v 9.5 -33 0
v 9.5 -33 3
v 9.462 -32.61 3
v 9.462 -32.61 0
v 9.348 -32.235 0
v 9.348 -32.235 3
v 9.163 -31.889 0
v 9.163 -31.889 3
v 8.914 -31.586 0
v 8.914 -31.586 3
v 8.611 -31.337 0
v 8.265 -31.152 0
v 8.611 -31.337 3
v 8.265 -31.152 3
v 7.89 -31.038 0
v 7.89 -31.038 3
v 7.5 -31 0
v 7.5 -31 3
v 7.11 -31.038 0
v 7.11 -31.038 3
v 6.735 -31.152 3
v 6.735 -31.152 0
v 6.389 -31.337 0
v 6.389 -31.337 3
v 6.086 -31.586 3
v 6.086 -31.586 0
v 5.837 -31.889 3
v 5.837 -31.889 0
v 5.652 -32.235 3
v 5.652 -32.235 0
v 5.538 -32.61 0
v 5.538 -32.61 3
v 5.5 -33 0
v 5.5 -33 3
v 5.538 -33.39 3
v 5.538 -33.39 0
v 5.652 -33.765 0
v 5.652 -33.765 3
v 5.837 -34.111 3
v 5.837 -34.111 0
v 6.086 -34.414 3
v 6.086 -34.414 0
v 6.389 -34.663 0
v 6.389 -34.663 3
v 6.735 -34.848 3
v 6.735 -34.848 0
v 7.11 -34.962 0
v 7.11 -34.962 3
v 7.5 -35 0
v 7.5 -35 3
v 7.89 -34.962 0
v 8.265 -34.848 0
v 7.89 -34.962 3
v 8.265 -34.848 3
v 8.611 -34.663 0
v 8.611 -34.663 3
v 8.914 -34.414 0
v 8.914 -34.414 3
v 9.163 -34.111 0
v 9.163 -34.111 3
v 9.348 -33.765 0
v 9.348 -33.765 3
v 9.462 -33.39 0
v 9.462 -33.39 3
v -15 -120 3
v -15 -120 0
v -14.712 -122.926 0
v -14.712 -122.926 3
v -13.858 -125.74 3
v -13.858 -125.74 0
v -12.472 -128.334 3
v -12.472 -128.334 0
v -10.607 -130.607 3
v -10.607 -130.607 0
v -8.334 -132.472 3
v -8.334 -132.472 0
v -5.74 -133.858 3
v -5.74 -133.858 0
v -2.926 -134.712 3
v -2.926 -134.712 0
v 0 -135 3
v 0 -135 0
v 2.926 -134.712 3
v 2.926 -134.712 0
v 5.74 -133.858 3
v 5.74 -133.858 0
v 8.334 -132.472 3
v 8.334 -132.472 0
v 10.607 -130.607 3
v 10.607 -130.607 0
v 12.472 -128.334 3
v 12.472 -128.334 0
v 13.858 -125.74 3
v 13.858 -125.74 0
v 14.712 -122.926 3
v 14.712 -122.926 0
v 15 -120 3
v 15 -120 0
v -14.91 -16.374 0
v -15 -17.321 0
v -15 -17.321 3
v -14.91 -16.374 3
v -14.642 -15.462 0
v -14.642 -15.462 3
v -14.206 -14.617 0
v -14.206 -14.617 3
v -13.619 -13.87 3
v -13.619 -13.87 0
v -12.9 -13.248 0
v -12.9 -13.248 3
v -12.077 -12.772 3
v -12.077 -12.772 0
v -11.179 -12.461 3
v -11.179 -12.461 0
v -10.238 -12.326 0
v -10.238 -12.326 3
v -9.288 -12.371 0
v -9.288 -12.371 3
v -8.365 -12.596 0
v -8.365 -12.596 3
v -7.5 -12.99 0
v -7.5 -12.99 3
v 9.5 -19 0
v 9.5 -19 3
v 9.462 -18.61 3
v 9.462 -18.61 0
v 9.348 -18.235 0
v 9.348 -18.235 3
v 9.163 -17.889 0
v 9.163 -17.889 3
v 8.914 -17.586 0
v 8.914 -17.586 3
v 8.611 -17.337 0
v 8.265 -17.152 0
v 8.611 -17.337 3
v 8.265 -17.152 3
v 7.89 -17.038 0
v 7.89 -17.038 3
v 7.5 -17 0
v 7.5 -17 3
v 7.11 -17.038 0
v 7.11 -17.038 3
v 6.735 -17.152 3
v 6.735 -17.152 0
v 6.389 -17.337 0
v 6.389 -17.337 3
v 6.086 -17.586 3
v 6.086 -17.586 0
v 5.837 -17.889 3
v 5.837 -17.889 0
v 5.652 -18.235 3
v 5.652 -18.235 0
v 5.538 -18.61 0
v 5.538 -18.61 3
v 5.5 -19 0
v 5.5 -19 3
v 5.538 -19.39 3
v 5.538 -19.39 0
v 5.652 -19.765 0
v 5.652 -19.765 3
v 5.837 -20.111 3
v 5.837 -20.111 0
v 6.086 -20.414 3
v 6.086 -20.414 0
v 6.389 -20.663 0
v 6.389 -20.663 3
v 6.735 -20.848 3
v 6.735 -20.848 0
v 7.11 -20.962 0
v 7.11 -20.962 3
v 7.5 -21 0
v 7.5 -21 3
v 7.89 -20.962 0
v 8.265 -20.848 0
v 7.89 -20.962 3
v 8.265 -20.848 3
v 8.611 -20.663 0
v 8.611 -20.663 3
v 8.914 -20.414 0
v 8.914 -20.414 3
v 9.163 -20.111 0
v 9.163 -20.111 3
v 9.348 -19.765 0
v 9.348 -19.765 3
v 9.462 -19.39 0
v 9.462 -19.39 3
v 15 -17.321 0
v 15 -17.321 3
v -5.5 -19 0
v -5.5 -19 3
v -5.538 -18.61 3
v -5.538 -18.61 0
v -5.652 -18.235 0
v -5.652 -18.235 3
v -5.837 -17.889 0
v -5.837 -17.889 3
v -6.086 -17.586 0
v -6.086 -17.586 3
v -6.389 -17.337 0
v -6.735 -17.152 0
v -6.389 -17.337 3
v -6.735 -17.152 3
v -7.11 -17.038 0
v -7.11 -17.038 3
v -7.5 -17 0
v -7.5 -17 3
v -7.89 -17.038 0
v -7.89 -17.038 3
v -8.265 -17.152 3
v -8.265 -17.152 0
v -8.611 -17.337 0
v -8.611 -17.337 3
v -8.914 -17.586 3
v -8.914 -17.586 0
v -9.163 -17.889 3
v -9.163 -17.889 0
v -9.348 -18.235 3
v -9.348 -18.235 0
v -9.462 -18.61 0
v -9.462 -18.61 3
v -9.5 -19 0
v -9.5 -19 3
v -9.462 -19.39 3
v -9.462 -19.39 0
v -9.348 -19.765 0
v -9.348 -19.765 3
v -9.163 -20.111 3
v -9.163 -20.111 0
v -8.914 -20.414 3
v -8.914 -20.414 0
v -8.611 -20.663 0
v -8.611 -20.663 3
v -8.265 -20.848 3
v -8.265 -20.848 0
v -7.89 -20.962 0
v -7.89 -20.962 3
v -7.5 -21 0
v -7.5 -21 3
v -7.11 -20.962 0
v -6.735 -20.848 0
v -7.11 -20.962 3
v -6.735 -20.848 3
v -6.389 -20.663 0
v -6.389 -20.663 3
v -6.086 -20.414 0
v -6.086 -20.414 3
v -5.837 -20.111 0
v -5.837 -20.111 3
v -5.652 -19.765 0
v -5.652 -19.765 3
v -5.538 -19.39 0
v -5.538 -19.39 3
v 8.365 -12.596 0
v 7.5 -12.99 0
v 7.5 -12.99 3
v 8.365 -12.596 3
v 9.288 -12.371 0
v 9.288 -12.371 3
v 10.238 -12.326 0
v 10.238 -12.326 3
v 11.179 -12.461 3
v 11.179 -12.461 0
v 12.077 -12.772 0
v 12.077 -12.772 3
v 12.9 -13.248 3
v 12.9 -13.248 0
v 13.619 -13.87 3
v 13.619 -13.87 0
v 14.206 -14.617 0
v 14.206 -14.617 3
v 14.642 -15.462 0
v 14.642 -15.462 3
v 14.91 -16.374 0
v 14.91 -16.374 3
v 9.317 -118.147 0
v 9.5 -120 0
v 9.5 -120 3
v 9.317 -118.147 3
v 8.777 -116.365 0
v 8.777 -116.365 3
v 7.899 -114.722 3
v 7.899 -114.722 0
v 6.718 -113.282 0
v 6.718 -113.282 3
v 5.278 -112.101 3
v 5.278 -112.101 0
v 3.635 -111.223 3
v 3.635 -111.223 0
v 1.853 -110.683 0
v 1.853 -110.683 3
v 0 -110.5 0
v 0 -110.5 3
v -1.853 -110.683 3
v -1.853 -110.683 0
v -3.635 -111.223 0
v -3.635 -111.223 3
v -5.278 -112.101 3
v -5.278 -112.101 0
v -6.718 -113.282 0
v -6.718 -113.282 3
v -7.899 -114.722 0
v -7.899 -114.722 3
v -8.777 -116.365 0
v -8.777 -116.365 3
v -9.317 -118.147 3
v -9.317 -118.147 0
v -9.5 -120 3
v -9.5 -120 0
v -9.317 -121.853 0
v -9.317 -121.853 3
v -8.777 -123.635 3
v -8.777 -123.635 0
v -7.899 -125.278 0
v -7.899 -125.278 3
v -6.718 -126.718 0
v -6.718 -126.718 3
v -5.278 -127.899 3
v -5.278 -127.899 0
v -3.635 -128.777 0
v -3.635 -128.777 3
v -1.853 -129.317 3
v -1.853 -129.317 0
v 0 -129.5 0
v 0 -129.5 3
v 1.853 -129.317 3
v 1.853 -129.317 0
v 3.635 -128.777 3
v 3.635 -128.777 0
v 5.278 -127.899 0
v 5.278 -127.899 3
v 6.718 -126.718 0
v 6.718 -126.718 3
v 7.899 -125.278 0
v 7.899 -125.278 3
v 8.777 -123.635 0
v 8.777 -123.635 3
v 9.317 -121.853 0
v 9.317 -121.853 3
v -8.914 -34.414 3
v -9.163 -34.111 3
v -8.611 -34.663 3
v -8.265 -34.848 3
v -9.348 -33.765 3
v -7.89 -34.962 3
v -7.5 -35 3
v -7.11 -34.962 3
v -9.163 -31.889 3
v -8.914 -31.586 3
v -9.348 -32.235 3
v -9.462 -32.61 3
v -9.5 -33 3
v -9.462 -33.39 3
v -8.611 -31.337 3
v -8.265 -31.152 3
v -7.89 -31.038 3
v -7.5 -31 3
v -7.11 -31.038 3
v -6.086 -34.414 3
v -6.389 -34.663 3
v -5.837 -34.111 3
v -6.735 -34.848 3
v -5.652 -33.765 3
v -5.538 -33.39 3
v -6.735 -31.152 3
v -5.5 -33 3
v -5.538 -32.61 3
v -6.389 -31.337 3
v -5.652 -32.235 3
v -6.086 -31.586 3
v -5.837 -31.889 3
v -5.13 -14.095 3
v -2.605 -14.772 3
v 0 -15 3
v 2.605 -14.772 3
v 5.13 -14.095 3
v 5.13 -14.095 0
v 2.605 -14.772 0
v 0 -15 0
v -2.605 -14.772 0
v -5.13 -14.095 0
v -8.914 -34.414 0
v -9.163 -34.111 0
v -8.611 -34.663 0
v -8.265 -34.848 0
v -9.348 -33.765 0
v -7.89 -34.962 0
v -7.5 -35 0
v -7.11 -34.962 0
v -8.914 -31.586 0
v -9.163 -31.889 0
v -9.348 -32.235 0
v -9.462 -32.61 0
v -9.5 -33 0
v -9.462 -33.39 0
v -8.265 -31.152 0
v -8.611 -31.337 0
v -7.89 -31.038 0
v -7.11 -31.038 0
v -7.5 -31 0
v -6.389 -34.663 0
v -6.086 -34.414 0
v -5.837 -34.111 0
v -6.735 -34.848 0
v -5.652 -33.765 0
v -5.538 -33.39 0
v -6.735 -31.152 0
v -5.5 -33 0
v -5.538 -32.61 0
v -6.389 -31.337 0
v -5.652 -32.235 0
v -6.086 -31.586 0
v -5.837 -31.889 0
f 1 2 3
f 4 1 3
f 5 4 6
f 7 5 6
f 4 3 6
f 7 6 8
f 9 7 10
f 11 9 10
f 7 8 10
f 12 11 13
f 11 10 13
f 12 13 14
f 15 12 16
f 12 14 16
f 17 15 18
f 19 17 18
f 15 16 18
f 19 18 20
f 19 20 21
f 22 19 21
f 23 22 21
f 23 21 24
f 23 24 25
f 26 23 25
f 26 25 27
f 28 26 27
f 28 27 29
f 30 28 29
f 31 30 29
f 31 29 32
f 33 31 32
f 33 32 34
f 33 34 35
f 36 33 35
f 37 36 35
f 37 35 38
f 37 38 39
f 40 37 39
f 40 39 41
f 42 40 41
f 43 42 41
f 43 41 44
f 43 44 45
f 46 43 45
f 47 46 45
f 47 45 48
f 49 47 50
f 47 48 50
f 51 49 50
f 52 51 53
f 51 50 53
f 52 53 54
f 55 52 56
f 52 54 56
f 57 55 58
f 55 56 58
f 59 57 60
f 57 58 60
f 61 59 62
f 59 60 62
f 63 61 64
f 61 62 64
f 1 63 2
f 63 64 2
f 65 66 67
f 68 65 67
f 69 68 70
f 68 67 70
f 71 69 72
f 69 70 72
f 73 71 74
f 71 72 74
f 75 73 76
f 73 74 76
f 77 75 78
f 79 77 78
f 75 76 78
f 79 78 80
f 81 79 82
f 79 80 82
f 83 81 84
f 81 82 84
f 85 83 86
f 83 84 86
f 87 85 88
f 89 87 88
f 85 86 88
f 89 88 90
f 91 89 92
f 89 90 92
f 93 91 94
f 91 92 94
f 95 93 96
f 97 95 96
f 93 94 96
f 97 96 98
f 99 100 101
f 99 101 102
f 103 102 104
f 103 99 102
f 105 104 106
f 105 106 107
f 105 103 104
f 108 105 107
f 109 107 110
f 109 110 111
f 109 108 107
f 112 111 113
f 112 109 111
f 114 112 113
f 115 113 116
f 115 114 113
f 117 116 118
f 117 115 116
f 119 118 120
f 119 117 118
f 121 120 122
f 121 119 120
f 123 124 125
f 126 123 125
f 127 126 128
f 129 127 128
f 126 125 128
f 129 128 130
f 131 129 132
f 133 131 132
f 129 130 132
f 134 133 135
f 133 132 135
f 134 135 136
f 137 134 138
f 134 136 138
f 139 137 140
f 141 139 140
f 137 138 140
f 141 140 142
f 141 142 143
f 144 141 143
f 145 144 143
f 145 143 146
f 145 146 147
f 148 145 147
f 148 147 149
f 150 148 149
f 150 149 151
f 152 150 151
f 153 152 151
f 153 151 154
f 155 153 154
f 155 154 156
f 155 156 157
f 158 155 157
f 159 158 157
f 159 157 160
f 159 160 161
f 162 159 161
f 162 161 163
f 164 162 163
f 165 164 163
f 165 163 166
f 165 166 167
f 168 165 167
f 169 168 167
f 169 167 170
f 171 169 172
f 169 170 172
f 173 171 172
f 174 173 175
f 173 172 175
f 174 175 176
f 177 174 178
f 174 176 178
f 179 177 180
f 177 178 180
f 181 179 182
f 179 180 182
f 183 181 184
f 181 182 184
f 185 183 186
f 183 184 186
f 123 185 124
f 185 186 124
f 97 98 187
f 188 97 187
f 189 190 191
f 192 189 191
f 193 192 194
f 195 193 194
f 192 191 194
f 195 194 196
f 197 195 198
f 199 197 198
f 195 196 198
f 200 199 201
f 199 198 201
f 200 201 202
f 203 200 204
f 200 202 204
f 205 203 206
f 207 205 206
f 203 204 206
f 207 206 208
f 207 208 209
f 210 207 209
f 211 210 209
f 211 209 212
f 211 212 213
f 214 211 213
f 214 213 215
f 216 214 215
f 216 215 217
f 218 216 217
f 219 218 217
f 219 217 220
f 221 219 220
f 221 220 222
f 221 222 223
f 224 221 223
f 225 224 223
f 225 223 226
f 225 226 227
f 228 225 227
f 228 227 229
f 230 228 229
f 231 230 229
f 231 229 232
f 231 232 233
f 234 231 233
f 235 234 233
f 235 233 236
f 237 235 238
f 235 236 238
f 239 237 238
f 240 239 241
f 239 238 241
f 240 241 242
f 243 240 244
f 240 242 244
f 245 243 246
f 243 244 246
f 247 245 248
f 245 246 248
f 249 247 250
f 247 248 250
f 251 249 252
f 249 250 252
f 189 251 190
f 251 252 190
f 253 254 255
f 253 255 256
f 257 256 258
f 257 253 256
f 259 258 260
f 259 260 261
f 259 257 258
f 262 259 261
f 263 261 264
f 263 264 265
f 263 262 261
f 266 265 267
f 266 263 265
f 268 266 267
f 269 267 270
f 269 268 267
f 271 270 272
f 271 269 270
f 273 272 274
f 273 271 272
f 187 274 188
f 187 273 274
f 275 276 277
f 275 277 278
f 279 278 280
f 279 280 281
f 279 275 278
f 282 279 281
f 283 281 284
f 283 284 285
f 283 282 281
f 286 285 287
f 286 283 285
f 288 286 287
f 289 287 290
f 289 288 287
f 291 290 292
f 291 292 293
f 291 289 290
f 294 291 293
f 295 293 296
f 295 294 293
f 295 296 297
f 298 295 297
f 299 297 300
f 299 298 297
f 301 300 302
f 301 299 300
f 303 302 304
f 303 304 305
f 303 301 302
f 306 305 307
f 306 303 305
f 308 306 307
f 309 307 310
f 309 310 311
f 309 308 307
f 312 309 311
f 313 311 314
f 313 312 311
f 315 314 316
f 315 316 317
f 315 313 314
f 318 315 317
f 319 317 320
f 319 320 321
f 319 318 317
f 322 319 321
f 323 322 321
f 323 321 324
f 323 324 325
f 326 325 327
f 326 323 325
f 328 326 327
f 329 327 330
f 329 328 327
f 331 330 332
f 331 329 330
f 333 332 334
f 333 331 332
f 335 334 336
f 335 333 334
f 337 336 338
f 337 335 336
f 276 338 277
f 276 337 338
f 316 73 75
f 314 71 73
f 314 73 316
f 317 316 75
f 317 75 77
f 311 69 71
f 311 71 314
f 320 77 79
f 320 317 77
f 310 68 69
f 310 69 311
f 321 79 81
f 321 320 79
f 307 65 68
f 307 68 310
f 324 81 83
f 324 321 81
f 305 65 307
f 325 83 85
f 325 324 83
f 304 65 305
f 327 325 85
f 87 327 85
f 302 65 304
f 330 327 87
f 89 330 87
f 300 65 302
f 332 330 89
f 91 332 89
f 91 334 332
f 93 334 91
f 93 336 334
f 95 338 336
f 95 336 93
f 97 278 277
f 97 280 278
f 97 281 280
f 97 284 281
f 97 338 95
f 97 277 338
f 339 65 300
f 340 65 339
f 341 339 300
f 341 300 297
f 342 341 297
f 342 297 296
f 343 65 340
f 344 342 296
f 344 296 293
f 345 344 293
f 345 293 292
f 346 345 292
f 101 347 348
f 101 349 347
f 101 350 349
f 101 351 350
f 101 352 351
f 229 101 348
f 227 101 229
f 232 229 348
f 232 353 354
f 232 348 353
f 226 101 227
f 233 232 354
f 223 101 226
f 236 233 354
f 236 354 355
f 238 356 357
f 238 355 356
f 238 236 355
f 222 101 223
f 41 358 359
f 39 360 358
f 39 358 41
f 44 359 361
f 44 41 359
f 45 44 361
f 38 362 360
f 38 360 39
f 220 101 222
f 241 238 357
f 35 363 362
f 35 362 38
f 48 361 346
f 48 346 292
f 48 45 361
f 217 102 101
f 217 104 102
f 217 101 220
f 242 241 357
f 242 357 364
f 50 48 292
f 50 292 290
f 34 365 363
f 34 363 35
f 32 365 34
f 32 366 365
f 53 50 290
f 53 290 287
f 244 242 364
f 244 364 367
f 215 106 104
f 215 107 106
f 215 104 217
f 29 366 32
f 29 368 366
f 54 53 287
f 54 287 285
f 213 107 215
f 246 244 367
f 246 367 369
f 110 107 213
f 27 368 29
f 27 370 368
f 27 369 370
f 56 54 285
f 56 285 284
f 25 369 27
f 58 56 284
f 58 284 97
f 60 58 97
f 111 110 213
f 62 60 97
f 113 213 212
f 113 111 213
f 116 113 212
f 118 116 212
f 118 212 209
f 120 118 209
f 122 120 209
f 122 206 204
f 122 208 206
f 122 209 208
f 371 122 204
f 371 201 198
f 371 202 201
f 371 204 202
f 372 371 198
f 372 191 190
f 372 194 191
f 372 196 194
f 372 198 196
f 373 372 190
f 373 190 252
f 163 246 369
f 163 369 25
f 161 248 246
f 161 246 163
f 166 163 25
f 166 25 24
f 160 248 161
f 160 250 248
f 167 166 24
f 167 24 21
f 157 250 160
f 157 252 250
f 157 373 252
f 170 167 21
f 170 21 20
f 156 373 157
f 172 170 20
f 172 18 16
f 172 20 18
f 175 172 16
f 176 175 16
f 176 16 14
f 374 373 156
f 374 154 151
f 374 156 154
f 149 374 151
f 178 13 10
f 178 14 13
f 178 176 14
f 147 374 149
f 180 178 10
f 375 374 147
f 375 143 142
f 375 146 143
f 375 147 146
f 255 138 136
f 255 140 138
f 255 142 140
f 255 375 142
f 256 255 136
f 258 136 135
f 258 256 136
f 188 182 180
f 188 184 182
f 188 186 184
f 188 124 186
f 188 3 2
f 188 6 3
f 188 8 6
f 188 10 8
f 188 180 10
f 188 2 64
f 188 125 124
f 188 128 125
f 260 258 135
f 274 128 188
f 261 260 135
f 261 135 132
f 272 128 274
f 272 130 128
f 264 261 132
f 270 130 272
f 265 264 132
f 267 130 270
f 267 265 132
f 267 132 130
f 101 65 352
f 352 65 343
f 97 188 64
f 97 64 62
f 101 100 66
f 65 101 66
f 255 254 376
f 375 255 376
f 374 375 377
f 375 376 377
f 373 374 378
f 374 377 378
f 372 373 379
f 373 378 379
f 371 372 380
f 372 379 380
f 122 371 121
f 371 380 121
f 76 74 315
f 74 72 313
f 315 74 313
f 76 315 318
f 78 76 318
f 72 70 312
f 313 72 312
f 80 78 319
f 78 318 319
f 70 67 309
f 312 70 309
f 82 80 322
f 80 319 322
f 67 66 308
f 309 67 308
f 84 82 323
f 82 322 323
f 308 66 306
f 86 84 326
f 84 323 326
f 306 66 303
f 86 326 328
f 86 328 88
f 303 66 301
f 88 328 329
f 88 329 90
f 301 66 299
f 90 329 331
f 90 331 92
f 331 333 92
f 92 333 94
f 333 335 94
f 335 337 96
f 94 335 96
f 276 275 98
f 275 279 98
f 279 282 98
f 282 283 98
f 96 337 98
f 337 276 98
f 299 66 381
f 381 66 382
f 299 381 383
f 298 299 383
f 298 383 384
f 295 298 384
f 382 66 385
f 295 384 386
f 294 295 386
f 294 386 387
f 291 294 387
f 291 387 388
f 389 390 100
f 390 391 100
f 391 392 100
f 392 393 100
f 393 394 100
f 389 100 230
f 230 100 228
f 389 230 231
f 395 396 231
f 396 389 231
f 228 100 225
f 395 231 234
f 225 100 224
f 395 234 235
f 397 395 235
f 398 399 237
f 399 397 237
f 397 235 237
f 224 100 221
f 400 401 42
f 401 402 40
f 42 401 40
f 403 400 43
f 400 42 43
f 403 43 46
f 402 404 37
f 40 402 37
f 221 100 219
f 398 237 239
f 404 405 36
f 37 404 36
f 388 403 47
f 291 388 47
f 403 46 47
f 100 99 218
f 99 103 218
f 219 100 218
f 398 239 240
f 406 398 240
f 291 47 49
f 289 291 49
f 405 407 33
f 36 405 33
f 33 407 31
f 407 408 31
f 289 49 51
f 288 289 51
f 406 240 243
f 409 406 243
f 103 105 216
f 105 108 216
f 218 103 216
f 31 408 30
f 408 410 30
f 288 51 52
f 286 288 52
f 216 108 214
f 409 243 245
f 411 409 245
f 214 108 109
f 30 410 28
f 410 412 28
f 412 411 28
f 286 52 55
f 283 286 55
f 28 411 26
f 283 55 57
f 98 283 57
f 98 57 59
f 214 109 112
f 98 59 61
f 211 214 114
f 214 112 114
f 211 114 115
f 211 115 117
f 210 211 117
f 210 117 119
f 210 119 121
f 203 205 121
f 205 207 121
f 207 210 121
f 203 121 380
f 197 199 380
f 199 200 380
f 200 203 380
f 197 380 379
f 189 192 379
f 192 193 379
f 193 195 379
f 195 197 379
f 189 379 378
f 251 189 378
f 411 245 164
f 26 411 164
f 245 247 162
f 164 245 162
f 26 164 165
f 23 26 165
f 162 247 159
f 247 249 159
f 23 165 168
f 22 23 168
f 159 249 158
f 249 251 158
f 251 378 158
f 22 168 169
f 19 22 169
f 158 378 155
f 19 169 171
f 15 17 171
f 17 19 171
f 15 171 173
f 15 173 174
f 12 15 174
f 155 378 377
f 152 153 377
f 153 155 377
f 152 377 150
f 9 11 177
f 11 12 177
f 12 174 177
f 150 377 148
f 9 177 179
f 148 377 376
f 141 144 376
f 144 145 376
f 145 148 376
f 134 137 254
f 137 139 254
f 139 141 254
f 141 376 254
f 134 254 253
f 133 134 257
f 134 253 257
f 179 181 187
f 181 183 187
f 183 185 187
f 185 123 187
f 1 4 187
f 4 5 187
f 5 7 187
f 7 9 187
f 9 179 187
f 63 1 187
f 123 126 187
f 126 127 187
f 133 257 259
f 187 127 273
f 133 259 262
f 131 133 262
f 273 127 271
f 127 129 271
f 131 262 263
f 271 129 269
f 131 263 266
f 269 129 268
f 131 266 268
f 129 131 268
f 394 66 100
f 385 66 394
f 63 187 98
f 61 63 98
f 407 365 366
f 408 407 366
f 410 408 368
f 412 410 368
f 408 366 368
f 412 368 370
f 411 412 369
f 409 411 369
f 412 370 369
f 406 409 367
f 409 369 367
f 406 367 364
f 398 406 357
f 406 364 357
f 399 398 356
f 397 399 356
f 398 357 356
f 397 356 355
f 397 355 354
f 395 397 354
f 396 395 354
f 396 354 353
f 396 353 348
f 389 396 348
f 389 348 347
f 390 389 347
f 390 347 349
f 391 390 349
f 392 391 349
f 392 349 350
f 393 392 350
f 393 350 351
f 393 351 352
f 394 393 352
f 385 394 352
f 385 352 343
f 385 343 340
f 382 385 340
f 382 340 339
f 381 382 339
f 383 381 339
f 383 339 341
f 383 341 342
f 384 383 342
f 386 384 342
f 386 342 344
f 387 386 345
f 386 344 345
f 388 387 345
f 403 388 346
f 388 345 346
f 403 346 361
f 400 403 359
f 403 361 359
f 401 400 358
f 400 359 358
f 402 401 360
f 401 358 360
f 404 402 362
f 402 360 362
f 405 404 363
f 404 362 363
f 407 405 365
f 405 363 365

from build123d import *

# Parameters (mm, degrees)
SKETCH_1_R          = 9.5
EXTRUDE_1_DEPTH     = 3
FILLET_START        = -1
FILLET_2_DEPTH      = 5
SKETCH_2_R          = 2
CUT_EXTRUDE_1_DEPTH = 10


with BuildPart() as part:
    # 草图1 → 凸台-拉伸1 (new body)
    with BuildSketch(Plane.XY):
        with BuildLine():
            Line((-15, 0), (-15, -120))
            ThreePointArc((-15, -120), (0, -135), (15, -120))
            Line((15, -120), (15, 0))
            ThreePointArc((15, 0), (0, -15), (-15, 0))
        make_face()
        with Locations((0, -120)):
            Circle(SKETCH_1_R, mode=Mode.SUBTRACT)
    extrude(amount=EXTRUDE_1_DEPTH)

    # 圆角2: read off the stored shape, not the designer's step
    # 圆角2 outline → 圆角2 (cut)
    with BuildSketch(Plane.XY.offset(FILLET_START)):
        with BuildLine():
            Line((-15, 0), (-15, -17.320508076))
            ThreePointArc((-15, -17.320508076), (-12.5, -12.990381057), (-7.5, -12.990381057))
            ThreePointArc((-7.5, -12.990381057), (-12.990381057, -7.5), (-15, 0))
        make_face()
        with BuildLine():
            ThreePointArc((15, 0), (12.990381057, -7.5), (7.5, -12.990381057))
            ThreePointArc((7.5, -12.990381057), (12.5, -12.990381057), (15, -17.320508076))
            Line((15, -17.320508076), (15, 0))
        make_face()
    extrude(amount=FILLET_2_DEPTH, mode=Mode.SUBTRACT)

    # 草图2 → 切除-拉伸1 (cut)
    with BuildSketch(Plane.XY.offset(3)):
        with Locations((-7.5, -19)):
            Circle(SKETCH_2_R)
        with Locations((-7.5, -33)):
            Circle(SKETCH_2_R)
        with Locations((7.5, -33)):
            Circle(SKETCH_2_R)
        with Locations((7.5, -19)):
            Circle(SKETCH_2_R)
    extrude(amount=-CUT_EXTRUDE_1_DEPTH, mode=Mode.SUBTRACT)


solid = part.part
